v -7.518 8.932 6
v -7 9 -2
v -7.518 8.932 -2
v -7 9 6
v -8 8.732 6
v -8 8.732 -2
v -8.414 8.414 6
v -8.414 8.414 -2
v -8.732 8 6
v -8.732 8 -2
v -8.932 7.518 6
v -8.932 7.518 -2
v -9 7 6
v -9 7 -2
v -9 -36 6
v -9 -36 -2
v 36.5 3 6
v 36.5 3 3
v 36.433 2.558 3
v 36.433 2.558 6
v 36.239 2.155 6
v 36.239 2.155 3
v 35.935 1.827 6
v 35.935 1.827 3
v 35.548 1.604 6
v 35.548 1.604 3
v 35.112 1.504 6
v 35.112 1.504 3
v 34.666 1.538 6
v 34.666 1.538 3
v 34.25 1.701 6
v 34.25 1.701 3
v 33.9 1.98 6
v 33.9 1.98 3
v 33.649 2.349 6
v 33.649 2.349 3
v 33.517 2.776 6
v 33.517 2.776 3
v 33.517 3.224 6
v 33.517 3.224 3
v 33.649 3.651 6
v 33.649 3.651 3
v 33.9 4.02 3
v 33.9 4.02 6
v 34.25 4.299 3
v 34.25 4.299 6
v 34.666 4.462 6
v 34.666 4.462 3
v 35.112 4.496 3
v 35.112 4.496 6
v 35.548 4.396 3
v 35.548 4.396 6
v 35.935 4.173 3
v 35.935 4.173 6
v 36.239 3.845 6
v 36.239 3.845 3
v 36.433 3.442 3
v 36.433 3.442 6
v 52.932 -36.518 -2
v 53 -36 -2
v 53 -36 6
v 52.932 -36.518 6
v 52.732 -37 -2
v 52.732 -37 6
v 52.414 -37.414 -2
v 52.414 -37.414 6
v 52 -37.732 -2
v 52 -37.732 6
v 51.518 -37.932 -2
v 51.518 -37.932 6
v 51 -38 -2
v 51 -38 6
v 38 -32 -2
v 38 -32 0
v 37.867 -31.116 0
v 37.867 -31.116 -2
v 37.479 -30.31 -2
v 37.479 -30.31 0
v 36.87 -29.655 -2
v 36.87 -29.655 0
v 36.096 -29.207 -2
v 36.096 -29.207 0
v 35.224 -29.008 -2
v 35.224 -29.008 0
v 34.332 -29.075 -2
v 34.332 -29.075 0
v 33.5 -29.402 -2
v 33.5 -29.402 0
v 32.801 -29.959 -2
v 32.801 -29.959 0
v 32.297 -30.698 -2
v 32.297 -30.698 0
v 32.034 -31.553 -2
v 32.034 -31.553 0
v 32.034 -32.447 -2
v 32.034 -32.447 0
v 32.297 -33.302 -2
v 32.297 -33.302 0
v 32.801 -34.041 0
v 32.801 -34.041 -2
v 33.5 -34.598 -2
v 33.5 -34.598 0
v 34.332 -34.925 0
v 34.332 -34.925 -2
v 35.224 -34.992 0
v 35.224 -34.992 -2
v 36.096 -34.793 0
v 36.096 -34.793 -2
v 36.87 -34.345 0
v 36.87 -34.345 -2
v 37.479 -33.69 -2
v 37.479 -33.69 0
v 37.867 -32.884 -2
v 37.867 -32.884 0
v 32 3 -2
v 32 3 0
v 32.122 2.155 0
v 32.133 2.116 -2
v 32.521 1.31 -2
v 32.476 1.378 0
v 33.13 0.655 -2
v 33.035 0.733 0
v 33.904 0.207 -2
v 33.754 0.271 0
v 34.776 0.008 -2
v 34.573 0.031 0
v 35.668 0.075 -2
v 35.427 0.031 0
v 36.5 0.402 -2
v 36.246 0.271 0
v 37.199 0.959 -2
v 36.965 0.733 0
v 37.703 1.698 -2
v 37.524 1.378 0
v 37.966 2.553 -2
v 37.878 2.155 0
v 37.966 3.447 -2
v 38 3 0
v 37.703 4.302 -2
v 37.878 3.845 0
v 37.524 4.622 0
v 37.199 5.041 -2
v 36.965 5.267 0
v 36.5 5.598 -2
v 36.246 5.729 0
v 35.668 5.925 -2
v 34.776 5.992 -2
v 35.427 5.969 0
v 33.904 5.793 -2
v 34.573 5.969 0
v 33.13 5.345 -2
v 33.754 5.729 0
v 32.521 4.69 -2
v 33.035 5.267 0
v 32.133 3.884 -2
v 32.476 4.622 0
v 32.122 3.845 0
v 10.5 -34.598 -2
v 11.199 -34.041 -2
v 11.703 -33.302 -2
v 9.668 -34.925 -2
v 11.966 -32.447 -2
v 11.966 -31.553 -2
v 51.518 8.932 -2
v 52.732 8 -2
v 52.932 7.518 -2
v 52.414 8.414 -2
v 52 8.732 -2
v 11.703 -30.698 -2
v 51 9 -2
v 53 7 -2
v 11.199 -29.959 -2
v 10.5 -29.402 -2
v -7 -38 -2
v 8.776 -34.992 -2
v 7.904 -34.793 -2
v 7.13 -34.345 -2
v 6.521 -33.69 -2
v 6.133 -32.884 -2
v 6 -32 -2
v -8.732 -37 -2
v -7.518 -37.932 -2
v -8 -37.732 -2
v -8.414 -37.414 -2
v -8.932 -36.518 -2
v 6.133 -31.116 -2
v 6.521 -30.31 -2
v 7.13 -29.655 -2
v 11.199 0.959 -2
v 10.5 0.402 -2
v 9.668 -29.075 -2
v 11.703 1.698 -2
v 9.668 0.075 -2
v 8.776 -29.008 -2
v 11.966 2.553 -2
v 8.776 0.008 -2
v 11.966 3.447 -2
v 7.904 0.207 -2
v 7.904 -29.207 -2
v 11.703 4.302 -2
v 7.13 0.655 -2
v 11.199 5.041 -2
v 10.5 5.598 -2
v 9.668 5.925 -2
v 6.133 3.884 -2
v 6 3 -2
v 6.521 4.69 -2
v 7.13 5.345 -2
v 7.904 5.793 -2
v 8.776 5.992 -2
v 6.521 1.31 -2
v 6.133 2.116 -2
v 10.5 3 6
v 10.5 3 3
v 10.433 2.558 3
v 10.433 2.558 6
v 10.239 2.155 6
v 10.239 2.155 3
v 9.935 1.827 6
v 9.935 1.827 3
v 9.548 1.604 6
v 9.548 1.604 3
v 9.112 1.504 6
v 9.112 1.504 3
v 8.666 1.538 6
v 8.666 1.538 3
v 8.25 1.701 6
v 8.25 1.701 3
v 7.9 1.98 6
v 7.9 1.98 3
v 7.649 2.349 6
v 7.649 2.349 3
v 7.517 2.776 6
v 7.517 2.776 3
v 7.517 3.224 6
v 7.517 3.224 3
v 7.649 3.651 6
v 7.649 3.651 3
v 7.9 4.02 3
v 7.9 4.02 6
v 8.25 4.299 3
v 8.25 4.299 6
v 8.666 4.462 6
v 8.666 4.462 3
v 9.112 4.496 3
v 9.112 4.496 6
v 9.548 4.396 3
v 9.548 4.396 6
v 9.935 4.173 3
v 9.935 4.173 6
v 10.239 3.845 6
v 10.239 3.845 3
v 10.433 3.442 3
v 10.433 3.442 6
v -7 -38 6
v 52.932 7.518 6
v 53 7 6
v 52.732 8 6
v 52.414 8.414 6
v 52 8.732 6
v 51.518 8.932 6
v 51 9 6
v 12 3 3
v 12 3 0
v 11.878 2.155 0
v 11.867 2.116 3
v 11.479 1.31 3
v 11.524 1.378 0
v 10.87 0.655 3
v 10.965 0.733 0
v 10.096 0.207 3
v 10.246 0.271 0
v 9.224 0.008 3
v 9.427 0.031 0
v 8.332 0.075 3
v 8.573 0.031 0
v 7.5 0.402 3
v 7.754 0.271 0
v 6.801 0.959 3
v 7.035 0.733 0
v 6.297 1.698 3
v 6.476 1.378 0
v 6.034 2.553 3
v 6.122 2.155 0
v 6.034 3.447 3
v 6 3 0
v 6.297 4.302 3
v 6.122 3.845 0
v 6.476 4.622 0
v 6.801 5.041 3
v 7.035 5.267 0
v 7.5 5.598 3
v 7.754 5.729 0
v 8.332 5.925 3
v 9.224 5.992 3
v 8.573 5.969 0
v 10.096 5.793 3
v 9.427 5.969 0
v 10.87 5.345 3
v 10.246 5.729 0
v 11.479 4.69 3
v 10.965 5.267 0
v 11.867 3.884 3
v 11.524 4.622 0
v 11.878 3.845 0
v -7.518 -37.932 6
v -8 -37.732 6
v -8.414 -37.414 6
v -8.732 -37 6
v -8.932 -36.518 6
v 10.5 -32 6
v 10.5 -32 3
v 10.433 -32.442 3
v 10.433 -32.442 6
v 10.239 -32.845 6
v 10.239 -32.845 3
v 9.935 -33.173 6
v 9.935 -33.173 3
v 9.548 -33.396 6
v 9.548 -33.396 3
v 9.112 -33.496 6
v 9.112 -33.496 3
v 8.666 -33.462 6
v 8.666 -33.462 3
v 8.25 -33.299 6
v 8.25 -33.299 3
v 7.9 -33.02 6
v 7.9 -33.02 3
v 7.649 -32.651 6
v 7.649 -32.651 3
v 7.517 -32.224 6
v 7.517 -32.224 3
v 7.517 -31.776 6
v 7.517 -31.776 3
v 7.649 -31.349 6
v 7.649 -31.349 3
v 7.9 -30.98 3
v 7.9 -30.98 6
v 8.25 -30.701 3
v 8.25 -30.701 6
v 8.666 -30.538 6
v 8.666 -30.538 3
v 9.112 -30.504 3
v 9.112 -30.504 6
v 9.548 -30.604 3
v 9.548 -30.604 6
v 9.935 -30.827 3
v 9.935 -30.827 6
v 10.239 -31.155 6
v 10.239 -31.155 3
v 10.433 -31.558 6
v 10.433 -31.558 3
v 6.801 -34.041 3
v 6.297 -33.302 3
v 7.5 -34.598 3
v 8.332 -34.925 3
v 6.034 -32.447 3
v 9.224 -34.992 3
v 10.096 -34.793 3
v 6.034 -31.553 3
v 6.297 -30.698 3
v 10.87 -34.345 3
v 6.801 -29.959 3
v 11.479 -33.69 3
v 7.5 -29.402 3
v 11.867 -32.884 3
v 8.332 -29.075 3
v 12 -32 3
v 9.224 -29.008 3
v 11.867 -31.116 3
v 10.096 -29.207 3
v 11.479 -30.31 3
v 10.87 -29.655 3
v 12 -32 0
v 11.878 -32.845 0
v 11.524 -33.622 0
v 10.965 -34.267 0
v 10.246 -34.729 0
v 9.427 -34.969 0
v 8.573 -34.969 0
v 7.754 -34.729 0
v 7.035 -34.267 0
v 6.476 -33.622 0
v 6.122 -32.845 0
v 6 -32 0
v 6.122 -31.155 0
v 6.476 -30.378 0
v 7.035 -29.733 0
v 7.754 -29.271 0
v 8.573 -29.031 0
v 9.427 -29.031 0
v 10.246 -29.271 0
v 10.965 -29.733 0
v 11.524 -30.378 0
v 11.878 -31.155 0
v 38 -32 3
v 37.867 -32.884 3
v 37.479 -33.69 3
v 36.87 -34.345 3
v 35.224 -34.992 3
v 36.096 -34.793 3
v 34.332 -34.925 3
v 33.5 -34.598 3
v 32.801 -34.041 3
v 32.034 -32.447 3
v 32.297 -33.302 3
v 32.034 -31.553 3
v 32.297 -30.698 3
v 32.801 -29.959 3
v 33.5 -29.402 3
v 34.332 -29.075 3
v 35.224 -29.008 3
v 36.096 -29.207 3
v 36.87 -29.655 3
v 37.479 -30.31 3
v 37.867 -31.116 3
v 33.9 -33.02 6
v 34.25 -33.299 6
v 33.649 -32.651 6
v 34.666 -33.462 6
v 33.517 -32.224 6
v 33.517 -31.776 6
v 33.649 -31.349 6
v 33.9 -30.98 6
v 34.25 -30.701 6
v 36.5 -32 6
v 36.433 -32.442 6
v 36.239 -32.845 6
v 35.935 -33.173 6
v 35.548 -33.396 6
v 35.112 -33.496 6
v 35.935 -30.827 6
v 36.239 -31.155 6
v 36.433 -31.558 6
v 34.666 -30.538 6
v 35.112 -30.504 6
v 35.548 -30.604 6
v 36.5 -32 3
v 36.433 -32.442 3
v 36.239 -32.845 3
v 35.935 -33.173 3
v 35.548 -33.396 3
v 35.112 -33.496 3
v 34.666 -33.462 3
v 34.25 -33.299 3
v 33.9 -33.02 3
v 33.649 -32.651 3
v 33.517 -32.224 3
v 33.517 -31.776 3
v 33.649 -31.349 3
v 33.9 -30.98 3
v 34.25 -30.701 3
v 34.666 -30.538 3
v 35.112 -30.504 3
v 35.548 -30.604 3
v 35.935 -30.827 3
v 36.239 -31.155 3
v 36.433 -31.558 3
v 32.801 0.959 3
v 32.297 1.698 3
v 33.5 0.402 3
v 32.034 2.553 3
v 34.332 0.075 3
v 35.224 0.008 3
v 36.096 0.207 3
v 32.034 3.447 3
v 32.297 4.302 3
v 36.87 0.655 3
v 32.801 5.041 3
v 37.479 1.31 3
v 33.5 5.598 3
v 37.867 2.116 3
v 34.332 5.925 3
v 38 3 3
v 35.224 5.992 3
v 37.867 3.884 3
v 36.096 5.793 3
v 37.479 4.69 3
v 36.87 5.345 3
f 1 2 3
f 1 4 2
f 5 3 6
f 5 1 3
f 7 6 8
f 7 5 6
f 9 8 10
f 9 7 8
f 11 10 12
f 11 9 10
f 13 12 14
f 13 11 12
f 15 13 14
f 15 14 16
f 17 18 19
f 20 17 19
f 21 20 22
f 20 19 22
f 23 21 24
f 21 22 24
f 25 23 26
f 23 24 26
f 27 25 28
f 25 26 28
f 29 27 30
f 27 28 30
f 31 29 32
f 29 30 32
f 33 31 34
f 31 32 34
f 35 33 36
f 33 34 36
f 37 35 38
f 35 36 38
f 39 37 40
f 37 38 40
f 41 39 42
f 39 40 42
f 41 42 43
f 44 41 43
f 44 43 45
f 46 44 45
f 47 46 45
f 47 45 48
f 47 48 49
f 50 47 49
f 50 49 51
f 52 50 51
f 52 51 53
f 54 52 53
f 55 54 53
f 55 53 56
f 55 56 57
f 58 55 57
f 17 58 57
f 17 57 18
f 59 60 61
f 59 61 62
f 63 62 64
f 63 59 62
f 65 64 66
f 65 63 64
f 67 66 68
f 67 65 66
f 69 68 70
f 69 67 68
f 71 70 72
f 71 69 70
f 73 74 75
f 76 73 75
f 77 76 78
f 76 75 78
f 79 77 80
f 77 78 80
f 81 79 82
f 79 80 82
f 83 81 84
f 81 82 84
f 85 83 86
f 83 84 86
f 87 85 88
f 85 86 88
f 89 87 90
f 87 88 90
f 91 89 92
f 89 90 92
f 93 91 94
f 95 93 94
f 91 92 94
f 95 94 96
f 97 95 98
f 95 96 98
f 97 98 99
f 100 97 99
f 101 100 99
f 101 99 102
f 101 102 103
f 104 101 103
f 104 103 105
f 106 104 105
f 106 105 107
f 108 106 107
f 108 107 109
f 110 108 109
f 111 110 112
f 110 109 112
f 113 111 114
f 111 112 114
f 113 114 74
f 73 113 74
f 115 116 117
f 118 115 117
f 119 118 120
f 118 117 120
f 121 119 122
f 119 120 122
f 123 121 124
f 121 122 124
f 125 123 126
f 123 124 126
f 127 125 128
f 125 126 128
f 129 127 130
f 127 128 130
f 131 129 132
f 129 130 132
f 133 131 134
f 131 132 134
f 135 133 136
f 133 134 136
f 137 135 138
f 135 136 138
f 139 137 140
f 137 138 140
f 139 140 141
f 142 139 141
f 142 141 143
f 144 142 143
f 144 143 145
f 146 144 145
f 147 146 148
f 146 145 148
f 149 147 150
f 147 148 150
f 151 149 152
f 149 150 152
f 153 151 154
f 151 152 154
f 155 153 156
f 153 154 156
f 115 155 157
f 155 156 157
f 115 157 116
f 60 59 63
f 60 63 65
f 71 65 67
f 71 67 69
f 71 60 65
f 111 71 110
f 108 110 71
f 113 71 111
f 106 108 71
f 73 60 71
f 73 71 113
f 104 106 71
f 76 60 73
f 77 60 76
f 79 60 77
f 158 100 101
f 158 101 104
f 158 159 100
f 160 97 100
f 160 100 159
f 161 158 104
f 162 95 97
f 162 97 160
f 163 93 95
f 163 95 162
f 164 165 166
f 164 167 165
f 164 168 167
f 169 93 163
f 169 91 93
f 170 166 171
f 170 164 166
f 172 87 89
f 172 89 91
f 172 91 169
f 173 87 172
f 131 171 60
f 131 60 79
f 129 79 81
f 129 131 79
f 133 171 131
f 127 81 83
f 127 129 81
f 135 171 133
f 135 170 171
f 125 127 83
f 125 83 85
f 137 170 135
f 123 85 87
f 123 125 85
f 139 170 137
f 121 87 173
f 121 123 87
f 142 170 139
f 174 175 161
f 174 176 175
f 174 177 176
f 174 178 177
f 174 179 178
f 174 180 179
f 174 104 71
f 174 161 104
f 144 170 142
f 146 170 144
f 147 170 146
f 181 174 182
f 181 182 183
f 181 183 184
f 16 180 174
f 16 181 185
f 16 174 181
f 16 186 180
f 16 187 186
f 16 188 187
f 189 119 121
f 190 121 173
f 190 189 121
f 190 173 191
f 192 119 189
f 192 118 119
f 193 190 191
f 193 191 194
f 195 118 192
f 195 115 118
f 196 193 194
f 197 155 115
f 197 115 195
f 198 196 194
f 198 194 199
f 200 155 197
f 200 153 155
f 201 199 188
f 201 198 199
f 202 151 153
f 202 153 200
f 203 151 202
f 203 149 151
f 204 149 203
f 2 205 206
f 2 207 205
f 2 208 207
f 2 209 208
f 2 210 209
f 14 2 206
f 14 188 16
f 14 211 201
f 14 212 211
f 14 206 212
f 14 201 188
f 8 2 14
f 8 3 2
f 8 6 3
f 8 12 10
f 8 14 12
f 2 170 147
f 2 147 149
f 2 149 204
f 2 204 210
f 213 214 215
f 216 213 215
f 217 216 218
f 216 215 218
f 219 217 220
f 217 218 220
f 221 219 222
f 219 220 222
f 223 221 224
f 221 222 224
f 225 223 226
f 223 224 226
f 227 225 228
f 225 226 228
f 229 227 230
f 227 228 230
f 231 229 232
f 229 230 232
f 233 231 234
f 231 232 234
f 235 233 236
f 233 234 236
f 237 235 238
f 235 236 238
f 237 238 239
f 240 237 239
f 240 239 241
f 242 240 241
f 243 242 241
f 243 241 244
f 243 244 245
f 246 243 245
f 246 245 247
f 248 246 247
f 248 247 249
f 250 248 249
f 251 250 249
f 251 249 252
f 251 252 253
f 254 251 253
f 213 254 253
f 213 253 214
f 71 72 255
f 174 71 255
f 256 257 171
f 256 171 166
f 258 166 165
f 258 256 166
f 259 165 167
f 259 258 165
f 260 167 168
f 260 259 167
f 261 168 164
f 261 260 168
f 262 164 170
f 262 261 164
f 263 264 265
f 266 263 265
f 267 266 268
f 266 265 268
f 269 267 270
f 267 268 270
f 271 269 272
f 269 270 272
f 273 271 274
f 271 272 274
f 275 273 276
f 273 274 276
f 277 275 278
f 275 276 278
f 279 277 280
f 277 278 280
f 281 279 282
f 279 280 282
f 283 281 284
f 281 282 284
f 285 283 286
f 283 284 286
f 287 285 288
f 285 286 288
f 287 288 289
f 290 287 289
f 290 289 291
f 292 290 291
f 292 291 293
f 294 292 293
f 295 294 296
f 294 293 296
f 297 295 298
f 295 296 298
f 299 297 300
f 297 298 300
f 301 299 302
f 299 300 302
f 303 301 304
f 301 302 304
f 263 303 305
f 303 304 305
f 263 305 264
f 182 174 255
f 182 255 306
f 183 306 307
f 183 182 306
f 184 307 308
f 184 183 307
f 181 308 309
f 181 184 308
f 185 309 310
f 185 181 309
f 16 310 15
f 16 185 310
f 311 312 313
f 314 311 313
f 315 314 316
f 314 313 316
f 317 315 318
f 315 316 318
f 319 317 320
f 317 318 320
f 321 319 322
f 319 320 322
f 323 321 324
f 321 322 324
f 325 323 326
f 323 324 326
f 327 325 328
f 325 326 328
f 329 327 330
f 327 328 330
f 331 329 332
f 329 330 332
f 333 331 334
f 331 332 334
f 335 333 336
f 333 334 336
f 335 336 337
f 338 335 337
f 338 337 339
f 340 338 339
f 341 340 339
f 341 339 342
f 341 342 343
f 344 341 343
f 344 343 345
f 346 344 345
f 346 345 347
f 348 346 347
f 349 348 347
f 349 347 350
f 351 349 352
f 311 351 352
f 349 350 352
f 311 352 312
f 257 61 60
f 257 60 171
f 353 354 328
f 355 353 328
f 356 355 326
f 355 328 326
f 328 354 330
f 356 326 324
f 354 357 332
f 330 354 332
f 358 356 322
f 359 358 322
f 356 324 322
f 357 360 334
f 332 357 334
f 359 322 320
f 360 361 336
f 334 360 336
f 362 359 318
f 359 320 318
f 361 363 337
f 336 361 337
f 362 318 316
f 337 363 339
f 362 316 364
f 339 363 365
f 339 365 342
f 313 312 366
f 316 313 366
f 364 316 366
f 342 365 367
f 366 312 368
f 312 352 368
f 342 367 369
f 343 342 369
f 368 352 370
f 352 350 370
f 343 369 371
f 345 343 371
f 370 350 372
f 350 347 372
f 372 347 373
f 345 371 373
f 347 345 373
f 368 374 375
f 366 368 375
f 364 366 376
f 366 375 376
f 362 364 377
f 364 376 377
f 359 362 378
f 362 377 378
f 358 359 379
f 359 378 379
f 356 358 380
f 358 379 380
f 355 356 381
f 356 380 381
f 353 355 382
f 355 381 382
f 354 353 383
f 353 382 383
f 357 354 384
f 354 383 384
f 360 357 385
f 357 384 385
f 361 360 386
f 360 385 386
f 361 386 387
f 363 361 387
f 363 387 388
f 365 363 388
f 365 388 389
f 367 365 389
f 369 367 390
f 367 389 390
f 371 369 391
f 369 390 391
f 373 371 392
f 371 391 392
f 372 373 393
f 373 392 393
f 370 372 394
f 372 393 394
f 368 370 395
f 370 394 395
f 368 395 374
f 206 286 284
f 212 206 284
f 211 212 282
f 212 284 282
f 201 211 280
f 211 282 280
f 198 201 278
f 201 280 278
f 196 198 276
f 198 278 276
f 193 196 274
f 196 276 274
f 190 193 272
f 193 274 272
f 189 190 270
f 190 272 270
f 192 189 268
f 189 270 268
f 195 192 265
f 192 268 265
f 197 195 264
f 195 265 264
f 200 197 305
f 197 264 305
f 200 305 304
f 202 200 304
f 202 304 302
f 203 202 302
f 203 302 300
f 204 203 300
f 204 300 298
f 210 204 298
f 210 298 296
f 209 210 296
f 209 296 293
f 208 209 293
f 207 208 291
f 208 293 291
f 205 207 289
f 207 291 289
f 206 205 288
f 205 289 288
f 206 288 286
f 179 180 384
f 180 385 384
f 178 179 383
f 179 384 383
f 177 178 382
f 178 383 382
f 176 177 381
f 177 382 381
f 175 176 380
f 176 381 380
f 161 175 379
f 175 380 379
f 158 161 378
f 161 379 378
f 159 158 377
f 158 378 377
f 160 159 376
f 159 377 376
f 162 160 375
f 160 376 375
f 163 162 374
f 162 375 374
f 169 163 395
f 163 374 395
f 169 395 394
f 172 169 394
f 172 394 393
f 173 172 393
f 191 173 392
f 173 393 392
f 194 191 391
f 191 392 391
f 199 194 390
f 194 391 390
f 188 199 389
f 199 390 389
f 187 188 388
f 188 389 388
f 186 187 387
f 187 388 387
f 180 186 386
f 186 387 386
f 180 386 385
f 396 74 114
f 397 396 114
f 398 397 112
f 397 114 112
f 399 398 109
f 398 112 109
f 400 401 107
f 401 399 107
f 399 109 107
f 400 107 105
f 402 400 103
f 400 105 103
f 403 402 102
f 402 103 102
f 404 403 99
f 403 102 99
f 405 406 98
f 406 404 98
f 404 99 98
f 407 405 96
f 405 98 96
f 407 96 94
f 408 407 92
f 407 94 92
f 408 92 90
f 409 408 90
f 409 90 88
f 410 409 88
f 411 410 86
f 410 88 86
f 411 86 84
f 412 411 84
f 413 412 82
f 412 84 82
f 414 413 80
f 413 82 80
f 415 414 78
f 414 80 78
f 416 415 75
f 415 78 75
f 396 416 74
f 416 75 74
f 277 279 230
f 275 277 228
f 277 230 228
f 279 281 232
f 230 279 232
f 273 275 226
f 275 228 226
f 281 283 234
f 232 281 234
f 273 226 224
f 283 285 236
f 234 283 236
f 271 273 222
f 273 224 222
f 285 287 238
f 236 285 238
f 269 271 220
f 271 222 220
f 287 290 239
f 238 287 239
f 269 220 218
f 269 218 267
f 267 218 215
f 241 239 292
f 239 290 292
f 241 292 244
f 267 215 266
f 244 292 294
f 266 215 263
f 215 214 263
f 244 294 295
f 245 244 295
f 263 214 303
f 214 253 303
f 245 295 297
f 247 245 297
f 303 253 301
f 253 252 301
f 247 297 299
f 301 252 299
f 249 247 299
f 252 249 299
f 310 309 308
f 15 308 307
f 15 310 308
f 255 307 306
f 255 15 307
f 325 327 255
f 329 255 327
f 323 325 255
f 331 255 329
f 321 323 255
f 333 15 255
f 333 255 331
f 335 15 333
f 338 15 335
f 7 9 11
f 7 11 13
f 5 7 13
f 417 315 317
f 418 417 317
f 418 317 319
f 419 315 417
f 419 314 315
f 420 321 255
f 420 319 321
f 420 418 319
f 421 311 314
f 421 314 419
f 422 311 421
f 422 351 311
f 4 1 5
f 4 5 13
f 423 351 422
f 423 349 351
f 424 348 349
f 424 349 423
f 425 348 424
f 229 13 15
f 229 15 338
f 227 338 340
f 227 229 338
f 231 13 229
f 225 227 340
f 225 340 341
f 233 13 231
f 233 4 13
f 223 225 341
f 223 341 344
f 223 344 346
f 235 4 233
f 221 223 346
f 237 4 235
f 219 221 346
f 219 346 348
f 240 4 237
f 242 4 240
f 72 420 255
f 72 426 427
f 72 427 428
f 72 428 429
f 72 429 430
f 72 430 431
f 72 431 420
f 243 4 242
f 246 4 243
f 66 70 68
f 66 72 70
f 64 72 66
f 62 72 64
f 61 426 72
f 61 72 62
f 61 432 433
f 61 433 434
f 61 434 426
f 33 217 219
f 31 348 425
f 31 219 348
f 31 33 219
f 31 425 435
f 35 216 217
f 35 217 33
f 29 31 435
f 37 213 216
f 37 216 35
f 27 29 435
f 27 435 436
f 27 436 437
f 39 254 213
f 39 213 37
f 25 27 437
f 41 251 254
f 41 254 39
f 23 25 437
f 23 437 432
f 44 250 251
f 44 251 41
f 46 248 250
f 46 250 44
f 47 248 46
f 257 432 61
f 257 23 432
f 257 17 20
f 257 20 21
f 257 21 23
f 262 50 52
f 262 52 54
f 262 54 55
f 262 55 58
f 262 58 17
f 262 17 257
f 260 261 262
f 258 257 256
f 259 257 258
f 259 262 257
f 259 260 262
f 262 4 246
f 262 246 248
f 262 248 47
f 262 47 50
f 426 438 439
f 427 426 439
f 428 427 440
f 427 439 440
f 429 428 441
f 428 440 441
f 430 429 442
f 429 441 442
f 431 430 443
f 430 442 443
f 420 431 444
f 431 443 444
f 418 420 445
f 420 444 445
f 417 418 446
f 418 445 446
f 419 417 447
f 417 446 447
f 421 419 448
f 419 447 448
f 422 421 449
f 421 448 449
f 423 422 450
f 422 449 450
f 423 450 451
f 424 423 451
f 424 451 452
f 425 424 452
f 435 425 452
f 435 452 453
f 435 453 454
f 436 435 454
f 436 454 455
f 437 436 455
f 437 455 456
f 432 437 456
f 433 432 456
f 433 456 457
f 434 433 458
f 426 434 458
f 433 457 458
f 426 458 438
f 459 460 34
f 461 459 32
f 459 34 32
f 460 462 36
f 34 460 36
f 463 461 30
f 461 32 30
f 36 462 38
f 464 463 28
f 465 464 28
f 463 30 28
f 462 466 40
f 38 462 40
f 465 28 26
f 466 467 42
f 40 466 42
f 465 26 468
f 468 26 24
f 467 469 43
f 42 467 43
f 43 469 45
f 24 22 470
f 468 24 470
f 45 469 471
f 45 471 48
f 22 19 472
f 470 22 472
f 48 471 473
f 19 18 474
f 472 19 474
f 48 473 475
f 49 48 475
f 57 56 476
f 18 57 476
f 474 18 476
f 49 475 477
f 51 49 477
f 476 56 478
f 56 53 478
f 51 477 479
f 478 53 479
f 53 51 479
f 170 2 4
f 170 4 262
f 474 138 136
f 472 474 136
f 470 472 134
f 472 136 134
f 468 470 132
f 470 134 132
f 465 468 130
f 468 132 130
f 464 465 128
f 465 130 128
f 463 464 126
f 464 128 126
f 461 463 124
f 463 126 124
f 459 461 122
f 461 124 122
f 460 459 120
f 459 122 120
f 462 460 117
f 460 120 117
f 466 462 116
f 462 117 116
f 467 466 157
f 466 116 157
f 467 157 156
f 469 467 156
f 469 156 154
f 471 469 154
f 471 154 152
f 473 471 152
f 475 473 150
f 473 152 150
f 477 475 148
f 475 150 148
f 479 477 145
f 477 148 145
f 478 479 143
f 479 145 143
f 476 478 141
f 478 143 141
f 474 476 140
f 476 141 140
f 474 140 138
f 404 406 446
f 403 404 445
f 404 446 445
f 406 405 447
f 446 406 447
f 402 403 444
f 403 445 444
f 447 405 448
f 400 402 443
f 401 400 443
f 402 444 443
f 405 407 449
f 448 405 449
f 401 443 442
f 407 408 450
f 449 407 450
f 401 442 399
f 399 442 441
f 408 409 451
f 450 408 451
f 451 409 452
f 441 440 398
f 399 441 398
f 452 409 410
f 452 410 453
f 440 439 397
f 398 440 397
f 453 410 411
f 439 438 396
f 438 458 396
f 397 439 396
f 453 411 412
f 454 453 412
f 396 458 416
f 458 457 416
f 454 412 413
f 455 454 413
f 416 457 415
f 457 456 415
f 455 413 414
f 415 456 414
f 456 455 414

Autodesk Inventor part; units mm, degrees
ref_plane "YZ Plane" through (0, 0, 0) normal (1, 0, 0) x (0, 1, 0)
ref_plane "XZ Plane" through (0, 0, 0) normal (0, 1, 0) x (-1, 0, 0)
ref_plane "XY Plane" through (0, 0, 0) normal (0, 0, 1) x (1, 0, 0)
sketch "Sketch9" plane through (0, 0, 0) normal (0, 0, 1) x (1, 0, 0)
  line L0 (44, 0) -> (44, -29)
  line L1 (0, -29) -> (0, 0)
  line L2 (44, 0) -> (38, 0)
  line L3 (0, -29) -> (6, -29)
  circle A0 centre (9, -32) radius 1.5
  circle A1 centre (35, -32) radius 1.5
  circle A2 centre (35, 3) radius 1.5
  circle A3 centre (9, 3) radius 1.5
  line L4 (0, 0) -> (0, 10)
  line L5 (0, 10) -> (-10, 10)
  line L6 (44, -29) -> (54, -29)
  line L7 (54, -29) -> (54, -39)
  line L8 (-10, 10) -> (54, 10)
  line L9 (54, 10) -> (54, -39)
  line L10 (54, -39) -> (-10, -39)
  line L11 (-10, -39) -> (-10, 10)
  line L12 (-10, 10) -> (-10, 13)
  line L13 (-10, 13) -> (-13, 13)
  line L14 (54, -39) -> (54, -42)
  line L15 (54, -42) -> (57, -42)
  line L16 (57, -42) -> (-13, -42)
  line L17 (-13, -42) -> (-13, 13)
  line L18 (-13, 13) -> (57, 13)
  line L19 (57, 13) -> (57, -42)
  circle A4 centre (9, 3) radius 3
  circle A5 centre (35, 3) radius 3
  circle A6 centre (35, -32) radius 3
  circle A7 centre (9, -32) radius 3
  dimension "d22" = 3
  dimension "d23" = 3
  dimension "d24" = 3
  dimension "d25" = 3
  dimension "d26" = 6
  dimension "d27" = 6
  dimension "d29" = 6
  dimension "d30" = 6
extrude "Extrusion1" add sketch "Sketch9" along normal blind 3 contours L8 L9 L7 L10 L11 L5 | L5 L12 L18 L19 L15 L14 L7 L9 L8 | L11 L10 L14 L16 L17 L13 L12
sketch "Sketch10" plane through (0, 0, 3) normal (0, 0, 1) x (1, 0, 0)
  line L0 (57, -42) -> (57, 13) projected
  line L1 (57, 11) -> (57, 10)
  line L2 (57, 13) -> (-13, 13) projected
  line L3 (55, 13) -> (54, 13)
  line L4 (54, 13) -> (54, 10)
  line L5 (57, 10) -> (57, 9)
  line L6 (54, 13) -> (53, 13)
  line L7 (53, 13) -> (53, 9)
  line L8 (-13, 13) -> (-13, -42) projected
  line L9 (-13, -40) -> (-13, -38)
  arc A0 (-13, -40) -> (-11, -42) centre (-11, -40) ccw projected
  line L10 (-11, -42) -> (-9, -42)
  line L11 (-13, -38) -> (-9, -38)
  line L12 (-9, -38) -> (-9, -42)
  line L13 (-9, -42) -> (-13, -42)
  line L14 (-13, -42) -> (-13, -38)
  line L15 (-9, -38) -> (53, -38)
  line L16 (53, -38) -> (53, 9)
  line L17 (53, 9) -> (-9, 9)
  line L18 (-9, 9) -> (-9, -38)
  line L19 (-13, -38) -> (-9, -38)
  line L20 (-9, -38) -> (-9, -42)
  line L21 (-9, -42) -> (-13, -42)
  line L22 (-13, -42) -> (-13, -38)
  line L23 (-9, 9) -> (53, 9)
  line L24 (53, 9) -> (53, -38)
  line L25 (53, -38) -> (-9, -38)
  line L26 (-9, -38) -> (-9, 9)
  line L27 (-13.4447, 13.4817) -> (58.1663, 13.4817)
  line L28 (58.1663, 13.4817) -> (58.1663, -42.7185)
  line L29 (58.1663, -42.7185) -> (-13.4447, -42.7185)
  line L30 (-13.4447, -42.7185) -> (-13.4447, 13.4817)
  line L31 (-9, 9) -> (53, 9)
  line L32 (53, 9) -> (53, -38)
  line L33 (53, -38) -> (-9, -38)
  line L34 (-9, -38) -> (-9, 9)
  line L35 (-14.6617, 14.1825) -> (60.6079, 14.1825)
  line L36 (60.6079, 14.1825) -> (60.6079, -44.8629)
  line L37 (60.6079, -44.8629) -> (-14.6617, -44.8629)
  line L38 (-14.6617, -44.8629) -> (-14.6617, 14.1825)
  point P0 (0, 0)
  point P1 (57, -40)
  point P2 (-11, 13)
  point P3 (-13, 11)
  point P4 (-13, -40)
  point P5 (-13, -40)
  dimension "d36" = 1
  dimension "d37" = 1
  dimension "d38" = 1
  dimension "d39" = 1
  dimension "d40" = 2
  dimension "d41" = 2
extrude "Extrusion4" cut sketch "Sketch10" against normal blind 6 contours L7 L17 L18 L11 L8 L2 | L11 L12 L10 A0 L8 | L27 L28 L29 L30
sketch "Sketch27" plane through (0, 0, 3) normal (0, 0, 1) x (1, 0, 0)
  point P0 (0, 0)
sketch "Sketch28" plane through (0, 0, 3) normal (0, 0, 1) x (1, 0, 0)
  line L0 (-9, 9) -> (53, 9)
  line L1 (53, 9) -> (53, -38)
  line L2 (53, -38) -> (-9, -38)
  line L3 (-9, -38) -> (-9, 9)
  point P0 (0, 0)
extrude "Extrusion7" add sketch "Sketch28" along normal blind 3
extrude "Extrusion8" cut sketch "Sketch9" against normal blind 6 contours A0 | A1 | A2 | A3
extrude "Extrusion9" cut sketch "Sketch9" along normal blind 82.9 contours A0 | A1 | A2 | A3
sketch "Sketch29" plane through (0, 0, 0) normal (0, 0, -1) x (-1, 0, 0)
  line L0 (17.5138, -45.6881) -> (10.4067, -45.6881)
  line L1 (10.4067, -45.6881) -> (10.4067, -38.0734)
  line L2 (10.4067, -38.0734) -> (17.5138, -38.0734)
  line L3 (17.5138, -38.0734) -> (17.5138, -45.6881)
  point P0 (0, 0)
extrude "Extrusion10" cut sketch "Sketch29" against normal blind 25.05
sketch "Sketch30" plane through (0, 0, 0) normal (0, 0, -1) x (-1, 0, 0)
  line L0 (-53, -38) -> (9, -38) projected
  line L1 (9, -38) -> (-53, -38)
  line L2 (-53, -38) -> (-53, 9.1187)
  line L3 (-53, 9.1187) -> (9, 9.1187)
  line L4 (9, 9.1187) -> (9, -38)
  point P0 (0, 0)
sketch "Sketch31" plane through (0, 0, 0) normal (0, 0, -1) x (-1, 0, 0)
  circle A0 centre (-9, -32) radius 3 projected
  circle A1 centre (-9, -32) radius 4
  circle A2 centre (-35, -32) radius 1.5 projected
  circle A3 centre (-9, 3) radius 3 projected
  circle A4 centre (-9, 3) radius 4
  circle A5 centre (-35, 3) radius 3 projected
  circle A6 centre (-35, 3) radius 4
  point P0 (0, 0)
extrude "Extrusion11" add sketch "Sketch30" along normal blind 2
extrude "Extrusion12" cut sketch "Sketch31" along normal blind 2 contours A0 | A3 | A5
sketch "Sketch32" plane through (0, 0, -2) normal (0, 0, -1) x (-1, 0, 0)
  point P0 (0, 0)
extrude "Extrusion14" cut sketch "Sketch31" along normal blind 8 contours A2
extrude "Extrusion15" cut sketch "Sketch9" against normal blind 4 contours A1 | A6
sketch "Sketch34" plane through (0, 0, -2) normal (0, 0, -1) x (-1, 0, 0)
  point P0 (0, 0)
sketch "Sketch35" plane through (0, 0, -2) normal (0, 0, -1) x (-1, 0, 0)
  line L0 (-53, -38) -> (-53, 9) projected
  line L1 (9, -38) -> (-53, -38)
  line L2 (-53, -38) -> (-53, 9)
  line L3 (-53, 9) -> (9, 9)
  line L4 (9, 9) -> (9, -38)
  line L5 (9, 9.1187) -> (-53, 9.1187) projected
  line L6 (9, 9) -> (-53, 9)
  line L7 (-53, 9) -> (-53, 9.1187)
  line L8 (-53, 9.1187) -> (9, 9.1187)
  line L9 (9, 9.1187) -> (9, 9)
  point P0 (0, 0)
extrude "Extrusion16" cut sketch "Sketch35" against normal blind 4 contours L7 L5 L9 L3
fillet "Fillet4" radius 2 4 edges at (-9, -38, 2) (53, -38, 2) (53, 9, 2) (-9, 9, 2)
properties part number "uchwyt_2"
